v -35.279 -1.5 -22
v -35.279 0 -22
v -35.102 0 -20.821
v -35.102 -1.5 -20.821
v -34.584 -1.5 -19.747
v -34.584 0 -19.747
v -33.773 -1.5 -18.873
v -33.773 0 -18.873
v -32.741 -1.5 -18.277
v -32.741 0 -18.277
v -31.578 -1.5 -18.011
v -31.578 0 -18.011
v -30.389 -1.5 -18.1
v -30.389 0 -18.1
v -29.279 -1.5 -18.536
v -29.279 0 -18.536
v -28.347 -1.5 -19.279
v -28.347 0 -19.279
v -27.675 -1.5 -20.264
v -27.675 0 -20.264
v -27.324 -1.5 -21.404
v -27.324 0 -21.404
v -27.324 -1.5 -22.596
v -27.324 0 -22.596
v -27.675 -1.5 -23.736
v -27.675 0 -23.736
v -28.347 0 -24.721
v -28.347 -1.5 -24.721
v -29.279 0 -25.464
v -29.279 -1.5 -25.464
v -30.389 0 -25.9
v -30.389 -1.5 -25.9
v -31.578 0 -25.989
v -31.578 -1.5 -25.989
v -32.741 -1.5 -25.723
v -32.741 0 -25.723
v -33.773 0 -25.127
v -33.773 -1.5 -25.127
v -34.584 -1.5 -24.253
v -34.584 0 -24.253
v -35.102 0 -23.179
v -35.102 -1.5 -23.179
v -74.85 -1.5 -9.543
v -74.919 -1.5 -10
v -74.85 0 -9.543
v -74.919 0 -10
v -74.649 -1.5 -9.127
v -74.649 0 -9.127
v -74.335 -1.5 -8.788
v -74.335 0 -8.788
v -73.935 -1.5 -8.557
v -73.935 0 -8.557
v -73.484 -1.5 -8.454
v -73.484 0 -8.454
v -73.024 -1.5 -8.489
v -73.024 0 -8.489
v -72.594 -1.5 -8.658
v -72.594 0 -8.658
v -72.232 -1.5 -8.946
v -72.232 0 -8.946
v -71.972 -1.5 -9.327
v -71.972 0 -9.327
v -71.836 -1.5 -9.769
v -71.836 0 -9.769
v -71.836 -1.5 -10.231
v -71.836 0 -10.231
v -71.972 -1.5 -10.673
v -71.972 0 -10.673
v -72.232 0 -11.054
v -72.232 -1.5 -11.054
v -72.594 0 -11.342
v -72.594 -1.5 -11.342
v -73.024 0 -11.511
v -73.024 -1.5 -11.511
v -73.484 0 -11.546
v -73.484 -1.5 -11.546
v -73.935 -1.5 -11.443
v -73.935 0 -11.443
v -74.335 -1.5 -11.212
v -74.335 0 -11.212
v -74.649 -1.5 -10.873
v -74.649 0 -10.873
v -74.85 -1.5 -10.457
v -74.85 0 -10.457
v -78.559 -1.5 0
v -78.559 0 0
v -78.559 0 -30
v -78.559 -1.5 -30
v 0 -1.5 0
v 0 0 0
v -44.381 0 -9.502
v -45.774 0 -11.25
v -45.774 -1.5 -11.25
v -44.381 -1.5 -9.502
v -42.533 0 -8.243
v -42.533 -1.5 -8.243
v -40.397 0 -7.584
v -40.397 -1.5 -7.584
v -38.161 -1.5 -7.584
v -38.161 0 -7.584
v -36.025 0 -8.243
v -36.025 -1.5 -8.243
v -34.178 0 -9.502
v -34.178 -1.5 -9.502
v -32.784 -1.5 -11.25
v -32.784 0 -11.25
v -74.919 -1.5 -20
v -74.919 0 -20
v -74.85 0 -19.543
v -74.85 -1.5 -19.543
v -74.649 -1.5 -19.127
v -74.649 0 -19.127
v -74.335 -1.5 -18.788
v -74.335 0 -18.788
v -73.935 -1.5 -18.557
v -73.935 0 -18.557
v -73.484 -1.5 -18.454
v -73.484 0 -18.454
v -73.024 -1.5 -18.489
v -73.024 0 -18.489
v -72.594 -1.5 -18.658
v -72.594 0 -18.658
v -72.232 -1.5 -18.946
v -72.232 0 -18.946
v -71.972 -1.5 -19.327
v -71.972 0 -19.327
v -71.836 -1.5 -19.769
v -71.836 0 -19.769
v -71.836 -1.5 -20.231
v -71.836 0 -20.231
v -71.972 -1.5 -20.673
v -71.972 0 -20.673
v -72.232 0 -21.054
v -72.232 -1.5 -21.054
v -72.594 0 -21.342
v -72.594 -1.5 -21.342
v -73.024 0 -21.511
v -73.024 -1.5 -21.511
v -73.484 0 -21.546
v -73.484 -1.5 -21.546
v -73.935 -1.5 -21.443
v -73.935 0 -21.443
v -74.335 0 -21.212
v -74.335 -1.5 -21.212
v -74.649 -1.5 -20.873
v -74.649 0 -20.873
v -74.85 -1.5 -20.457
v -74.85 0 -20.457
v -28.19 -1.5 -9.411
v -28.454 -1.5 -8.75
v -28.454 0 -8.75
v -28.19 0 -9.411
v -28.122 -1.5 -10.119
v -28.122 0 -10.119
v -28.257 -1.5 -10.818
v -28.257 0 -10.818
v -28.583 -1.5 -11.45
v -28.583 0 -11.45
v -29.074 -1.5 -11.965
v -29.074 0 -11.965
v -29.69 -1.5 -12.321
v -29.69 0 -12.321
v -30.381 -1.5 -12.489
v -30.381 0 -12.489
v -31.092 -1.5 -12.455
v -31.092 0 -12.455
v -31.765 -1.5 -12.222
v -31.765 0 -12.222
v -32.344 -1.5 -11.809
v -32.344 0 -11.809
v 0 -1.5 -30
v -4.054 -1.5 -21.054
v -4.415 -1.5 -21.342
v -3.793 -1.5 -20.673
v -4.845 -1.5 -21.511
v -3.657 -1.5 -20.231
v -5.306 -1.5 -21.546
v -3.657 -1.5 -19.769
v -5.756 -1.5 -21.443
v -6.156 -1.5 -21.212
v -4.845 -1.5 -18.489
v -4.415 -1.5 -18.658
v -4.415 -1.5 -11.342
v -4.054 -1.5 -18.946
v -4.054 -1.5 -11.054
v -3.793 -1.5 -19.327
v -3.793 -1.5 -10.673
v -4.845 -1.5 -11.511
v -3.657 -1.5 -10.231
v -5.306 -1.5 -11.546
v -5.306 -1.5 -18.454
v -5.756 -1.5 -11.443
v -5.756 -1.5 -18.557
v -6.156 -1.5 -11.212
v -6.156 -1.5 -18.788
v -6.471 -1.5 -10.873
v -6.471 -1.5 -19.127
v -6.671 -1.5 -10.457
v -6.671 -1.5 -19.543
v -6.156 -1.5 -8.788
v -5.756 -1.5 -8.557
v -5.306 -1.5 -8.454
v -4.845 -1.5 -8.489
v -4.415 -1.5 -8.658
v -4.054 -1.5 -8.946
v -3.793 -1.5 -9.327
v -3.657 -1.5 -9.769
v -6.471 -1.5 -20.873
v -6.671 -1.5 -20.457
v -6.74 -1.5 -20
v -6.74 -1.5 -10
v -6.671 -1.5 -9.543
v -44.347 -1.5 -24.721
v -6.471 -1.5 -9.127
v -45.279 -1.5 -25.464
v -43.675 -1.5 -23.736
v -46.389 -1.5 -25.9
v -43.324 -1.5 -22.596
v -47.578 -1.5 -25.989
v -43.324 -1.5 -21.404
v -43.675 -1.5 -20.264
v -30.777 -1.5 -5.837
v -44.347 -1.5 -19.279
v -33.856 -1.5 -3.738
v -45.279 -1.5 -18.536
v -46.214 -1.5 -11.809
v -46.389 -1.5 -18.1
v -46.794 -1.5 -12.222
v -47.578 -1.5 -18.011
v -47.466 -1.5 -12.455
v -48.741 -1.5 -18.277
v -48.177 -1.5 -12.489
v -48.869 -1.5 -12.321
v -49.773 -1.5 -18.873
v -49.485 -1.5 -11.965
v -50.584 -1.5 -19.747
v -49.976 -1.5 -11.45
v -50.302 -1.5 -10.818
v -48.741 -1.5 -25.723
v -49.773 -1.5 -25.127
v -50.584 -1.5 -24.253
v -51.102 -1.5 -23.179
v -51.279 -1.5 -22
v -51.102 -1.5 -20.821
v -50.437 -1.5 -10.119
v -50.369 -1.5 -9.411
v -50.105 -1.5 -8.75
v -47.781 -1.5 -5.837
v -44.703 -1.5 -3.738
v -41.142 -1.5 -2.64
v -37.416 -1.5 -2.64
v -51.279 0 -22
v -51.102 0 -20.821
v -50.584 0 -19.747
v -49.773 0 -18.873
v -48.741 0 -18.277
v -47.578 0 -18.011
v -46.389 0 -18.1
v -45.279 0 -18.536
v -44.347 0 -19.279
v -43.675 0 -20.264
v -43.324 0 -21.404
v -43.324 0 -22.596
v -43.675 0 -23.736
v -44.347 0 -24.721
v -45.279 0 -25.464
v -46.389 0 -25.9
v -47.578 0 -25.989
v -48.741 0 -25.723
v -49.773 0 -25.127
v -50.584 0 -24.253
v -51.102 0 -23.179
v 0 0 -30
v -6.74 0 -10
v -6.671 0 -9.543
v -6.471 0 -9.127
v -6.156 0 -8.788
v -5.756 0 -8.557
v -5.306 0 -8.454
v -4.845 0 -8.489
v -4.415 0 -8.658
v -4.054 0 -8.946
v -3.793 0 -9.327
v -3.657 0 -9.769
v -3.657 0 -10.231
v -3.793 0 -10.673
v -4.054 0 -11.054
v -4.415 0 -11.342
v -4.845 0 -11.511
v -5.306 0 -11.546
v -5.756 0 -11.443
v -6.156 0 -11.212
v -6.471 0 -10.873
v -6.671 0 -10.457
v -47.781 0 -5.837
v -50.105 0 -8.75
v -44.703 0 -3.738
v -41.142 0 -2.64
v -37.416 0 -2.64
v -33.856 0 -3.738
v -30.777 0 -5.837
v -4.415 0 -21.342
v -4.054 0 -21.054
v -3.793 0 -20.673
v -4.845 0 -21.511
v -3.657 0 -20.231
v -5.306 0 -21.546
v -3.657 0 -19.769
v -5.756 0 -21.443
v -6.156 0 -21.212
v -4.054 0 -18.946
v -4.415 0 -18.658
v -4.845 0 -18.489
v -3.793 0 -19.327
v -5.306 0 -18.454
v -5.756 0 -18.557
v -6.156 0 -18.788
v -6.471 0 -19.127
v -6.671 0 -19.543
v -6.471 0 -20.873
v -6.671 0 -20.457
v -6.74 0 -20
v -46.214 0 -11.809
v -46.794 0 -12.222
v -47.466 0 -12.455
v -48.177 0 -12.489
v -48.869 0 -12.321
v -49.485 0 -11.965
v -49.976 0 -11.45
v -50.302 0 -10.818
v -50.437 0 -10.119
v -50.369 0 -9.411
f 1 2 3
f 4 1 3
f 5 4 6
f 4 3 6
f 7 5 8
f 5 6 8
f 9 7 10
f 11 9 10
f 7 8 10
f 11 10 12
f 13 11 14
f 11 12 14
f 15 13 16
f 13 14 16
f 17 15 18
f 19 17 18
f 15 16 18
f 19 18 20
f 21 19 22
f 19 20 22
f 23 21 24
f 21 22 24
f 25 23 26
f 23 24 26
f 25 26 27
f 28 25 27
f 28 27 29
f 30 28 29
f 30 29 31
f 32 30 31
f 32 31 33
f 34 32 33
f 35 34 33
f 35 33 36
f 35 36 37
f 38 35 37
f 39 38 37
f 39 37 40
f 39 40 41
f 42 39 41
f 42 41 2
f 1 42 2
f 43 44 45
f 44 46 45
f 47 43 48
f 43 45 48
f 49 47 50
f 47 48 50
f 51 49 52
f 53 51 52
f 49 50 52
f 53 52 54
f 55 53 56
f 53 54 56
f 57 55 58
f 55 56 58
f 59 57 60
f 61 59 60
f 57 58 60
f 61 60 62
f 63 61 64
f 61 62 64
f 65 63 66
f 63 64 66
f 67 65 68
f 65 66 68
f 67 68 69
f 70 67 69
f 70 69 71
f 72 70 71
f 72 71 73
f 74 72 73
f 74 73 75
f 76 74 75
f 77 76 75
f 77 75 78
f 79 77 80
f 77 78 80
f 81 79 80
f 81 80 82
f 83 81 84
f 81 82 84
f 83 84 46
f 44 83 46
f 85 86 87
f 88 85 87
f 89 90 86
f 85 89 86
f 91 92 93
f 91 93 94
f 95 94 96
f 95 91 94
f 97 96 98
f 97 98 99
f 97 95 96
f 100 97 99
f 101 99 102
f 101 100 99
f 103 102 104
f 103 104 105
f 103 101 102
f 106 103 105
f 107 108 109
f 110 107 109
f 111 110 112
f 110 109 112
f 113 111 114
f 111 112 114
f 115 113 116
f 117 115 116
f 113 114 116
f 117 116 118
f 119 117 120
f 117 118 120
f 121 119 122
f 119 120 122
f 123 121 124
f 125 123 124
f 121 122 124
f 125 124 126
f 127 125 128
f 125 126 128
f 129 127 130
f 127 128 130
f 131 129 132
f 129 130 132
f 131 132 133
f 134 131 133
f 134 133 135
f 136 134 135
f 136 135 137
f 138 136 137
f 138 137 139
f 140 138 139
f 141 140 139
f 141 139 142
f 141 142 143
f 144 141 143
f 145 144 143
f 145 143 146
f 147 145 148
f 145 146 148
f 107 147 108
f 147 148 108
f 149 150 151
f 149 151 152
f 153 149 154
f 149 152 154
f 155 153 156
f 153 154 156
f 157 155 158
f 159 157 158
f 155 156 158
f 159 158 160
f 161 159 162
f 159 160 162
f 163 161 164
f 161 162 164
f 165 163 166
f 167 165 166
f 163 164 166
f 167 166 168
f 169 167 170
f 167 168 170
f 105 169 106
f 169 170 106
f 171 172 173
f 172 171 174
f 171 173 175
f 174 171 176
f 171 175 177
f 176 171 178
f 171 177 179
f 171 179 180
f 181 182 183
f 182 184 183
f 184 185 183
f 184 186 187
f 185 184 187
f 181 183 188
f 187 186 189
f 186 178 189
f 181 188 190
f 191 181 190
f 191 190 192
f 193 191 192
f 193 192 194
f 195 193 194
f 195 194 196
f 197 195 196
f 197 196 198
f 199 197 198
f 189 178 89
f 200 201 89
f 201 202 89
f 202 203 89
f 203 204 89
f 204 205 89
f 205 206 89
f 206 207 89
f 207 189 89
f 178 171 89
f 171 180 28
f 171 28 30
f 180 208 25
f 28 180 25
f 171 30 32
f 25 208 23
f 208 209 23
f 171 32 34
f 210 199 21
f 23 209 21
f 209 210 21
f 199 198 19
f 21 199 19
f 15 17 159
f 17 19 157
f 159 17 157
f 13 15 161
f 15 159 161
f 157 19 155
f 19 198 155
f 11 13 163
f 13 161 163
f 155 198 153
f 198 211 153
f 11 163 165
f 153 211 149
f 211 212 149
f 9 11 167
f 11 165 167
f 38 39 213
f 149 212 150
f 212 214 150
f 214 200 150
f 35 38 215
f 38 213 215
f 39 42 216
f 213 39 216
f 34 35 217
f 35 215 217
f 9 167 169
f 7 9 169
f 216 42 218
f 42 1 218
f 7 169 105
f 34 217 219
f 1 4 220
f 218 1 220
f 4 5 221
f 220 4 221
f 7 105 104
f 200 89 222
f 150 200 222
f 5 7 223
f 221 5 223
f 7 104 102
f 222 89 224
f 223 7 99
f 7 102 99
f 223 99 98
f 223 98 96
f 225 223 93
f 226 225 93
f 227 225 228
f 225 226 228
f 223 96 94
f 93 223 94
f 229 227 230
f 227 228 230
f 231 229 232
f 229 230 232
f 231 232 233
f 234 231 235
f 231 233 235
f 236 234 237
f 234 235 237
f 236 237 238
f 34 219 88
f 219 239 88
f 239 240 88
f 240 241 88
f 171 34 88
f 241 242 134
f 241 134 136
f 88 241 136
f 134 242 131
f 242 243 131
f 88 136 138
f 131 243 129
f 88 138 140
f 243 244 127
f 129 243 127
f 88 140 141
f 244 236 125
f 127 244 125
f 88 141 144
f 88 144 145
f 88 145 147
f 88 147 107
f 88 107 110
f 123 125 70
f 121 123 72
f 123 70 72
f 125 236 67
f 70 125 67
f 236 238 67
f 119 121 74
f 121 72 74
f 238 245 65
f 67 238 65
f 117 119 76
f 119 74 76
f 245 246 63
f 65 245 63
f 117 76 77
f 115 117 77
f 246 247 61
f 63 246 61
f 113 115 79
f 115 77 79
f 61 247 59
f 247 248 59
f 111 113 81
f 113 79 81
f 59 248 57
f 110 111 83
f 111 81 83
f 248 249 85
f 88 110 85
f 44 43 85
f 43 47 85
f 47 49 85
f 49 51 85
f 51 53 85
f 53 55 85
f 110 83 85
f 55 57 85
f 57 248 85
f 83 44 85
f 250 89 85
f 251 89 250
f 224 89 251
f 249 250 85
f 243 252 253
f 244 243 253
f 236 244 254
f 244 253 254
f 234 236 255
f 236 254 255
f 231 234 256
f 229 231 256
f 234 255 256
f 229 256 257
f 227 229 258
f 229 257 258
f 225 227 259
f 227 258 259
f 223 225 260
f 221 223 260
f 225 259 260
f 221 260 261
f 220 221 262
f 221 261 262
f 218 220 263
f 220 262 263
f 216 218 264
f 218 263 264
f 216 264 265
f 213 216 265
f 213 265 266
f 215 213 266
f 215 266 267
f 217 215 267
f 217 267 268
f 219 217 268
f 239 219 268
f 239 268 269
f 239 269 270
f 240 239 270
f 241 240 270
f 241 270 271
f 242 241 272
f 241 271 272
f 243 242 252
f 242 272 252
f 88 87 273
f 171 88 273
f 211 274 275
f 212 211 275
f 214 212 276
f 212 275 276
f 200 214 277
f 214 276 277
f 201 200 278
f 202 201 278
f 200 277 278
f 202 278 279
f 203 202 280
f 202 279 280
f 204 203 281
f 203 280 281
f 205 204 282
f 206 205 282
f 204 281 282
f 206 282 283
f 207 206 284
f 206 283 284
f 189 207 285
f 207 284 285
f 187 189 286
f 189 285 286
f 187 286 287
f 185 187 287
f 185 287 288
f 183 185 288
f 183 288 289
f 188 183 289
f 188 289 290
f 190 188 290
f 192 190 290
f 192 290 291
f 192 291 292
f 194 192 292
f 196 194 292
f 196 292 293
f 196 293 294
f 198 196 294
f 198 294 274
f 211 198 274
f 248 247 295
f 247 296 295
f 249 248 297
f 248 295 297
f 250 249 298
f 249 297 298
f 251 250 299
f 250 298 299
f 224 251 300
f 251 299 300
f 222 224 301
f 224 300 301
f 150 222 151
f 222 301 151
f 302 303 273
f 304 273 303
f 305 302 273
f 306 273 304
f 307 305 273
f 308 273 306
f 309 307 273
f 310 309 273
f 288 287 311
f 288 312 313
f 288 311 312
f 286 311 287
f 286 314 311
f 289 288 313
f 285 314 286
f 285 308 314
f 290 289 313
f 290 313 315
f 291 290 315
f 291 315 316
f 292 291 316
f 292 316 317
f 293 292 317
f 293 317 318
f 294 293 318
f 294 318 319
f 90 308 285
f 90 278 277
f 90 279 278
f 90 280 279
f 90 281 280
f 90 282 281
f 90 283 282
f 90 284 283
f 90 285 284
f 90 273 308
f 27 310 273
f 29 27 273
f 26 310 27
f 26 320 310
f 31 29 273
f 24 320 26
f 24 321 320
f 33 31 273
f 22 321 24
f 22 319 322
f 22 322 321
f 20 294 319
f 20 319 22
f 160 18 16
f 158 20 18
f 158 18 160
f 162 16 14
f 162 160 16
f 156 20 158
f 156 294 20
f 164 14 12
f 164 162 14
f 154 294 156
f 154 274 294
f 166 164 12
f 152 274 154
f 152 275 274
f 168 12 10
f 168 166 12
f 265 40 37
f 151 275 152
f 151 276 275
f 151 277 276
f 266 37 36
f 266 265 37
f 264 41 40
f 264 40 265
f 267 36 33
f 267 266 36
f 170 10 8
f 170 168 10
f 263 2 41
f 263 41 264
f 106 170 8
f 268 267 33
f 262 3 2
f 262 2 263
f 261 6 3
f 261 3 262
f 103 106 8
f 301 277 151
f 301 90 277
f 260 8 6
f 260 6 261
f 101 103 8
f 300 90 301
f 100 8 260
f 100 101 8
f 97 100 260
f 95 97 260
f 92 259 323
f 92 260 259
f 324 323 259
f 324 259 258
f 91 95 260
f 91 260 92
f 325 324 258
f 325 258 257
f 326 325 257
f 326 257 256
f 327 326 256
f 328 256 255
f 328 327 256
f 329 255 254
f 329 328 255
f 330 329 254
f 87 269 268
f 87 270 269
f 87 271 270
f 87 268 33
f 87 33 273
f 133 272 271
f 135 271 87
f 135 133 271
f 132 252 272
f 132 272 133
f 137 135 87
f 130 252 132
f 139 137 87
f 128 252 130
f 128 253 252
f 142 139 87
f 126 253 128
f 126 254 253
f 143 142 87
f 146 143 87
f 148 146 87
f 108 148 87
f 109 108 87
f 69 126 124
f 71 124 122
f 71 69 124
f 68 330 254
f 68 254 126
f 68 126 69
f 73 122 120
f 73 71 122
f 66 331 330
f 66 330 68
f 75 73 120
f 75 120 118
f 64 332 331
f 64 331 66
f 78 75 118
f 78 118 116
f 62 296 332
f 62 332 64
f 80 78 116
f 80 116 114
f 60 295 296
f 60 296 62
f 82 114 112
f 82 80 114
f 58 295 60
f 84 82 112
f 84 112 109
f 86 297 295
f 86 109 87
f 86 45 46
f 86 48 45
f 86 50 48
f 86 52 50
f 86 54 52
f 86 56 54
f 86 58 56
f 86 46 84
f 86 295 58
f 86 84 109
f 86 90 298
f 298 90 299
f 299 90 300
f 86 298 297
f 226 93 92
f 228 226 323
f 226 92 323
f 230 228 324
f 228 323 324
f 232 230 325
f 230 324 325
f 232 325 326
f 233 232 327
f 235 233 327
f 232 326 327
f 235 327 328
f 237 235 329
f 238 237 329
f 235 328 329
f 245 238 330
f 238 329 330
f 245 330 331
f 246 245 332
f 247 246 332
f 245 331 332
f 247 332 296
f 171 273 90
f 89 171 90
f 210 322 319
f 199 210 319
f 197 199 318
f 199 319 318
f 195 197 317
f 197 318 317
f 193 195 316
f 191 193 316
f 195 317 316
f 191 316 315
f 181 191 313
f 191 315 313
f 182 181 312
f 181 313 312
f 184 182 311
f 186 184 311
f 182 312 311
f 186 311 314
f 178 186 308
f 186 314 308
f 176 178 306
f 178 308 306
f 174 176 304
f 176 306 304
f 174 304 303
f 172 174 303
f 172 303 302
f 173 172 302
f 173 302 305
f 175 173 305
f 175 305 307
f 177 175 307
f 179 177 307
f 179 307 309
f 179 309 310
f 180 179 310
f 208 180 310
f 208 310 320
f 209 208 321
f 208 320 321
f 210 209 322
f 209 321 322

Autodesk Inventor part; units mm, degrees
ref_plane "YZ Plane" through (0, 0, 0) normal (1, 0, 0) x (0, 1, 0)
ref_plane "XZ Plane" through (0, 0, 0) normal (0, 1, 0) x (-1, 0, 0)
ref_plane "XY Plane" through (0, 0, 0) normal (0, 0, 1) x (1, 0, 0)
sketch "Sketch1" plane through (0, 0, 0) normal (0, 1, 0) x (-1, 0, 0)
  line L0 (20.6396, 0) -> (20.6396, -30)
  line L1 (57.9189, -30) -> (57.9189, 0)
  arc A0 (50.1046, -8.75) -> (28.454, -8.75) centre (39.2793, -15) ccw
  arc A1 (28.454, -8.75) -> (32.7841, -11.25) centre (30.619, -10) ccw
  arc A2 (45.7745, -11.25) -> (32.7841, -11.25) centre (39.2793, -15) ccw
  arc A3 (45.7745, -11.25) -> (50.1046, -8.75) centre (47.9395, -10) ccw
  circle A4 centre (47.2793, -22) radius 4
  circle A5 centre (31.2793, -22) radius 4
  circle A6 centre (73.3686, -10) radius 1.55
  circle A7 centre (5.19, -10) radius 1.55
  circle A8 centre (73.3686, -20) radius 1.55
  circle A9 centre (5.19, -20) radius 1.55
  line L2 (0, -30) -> (0, 0)
  line L3 (78.5586, -30) -> (0, -30)
  line L4 (0, 0) -> (78.5586, 0)
  line L5 (78.5586, 0) -> (78.5586, -30)
  line L6 (58.3686, 0) -> (58.3686, -30)
  line L7 (57.4693, -30) -> (57.4693, 0)
  line L8 (21.0893, 0) -> (21.0893, -30)
  line L9 (20.19, -30) -> (20.19, 0)
extrude "Extrusion1" add sketch "Sketch1" against normal blind 1.5
properties part number "Head2"
